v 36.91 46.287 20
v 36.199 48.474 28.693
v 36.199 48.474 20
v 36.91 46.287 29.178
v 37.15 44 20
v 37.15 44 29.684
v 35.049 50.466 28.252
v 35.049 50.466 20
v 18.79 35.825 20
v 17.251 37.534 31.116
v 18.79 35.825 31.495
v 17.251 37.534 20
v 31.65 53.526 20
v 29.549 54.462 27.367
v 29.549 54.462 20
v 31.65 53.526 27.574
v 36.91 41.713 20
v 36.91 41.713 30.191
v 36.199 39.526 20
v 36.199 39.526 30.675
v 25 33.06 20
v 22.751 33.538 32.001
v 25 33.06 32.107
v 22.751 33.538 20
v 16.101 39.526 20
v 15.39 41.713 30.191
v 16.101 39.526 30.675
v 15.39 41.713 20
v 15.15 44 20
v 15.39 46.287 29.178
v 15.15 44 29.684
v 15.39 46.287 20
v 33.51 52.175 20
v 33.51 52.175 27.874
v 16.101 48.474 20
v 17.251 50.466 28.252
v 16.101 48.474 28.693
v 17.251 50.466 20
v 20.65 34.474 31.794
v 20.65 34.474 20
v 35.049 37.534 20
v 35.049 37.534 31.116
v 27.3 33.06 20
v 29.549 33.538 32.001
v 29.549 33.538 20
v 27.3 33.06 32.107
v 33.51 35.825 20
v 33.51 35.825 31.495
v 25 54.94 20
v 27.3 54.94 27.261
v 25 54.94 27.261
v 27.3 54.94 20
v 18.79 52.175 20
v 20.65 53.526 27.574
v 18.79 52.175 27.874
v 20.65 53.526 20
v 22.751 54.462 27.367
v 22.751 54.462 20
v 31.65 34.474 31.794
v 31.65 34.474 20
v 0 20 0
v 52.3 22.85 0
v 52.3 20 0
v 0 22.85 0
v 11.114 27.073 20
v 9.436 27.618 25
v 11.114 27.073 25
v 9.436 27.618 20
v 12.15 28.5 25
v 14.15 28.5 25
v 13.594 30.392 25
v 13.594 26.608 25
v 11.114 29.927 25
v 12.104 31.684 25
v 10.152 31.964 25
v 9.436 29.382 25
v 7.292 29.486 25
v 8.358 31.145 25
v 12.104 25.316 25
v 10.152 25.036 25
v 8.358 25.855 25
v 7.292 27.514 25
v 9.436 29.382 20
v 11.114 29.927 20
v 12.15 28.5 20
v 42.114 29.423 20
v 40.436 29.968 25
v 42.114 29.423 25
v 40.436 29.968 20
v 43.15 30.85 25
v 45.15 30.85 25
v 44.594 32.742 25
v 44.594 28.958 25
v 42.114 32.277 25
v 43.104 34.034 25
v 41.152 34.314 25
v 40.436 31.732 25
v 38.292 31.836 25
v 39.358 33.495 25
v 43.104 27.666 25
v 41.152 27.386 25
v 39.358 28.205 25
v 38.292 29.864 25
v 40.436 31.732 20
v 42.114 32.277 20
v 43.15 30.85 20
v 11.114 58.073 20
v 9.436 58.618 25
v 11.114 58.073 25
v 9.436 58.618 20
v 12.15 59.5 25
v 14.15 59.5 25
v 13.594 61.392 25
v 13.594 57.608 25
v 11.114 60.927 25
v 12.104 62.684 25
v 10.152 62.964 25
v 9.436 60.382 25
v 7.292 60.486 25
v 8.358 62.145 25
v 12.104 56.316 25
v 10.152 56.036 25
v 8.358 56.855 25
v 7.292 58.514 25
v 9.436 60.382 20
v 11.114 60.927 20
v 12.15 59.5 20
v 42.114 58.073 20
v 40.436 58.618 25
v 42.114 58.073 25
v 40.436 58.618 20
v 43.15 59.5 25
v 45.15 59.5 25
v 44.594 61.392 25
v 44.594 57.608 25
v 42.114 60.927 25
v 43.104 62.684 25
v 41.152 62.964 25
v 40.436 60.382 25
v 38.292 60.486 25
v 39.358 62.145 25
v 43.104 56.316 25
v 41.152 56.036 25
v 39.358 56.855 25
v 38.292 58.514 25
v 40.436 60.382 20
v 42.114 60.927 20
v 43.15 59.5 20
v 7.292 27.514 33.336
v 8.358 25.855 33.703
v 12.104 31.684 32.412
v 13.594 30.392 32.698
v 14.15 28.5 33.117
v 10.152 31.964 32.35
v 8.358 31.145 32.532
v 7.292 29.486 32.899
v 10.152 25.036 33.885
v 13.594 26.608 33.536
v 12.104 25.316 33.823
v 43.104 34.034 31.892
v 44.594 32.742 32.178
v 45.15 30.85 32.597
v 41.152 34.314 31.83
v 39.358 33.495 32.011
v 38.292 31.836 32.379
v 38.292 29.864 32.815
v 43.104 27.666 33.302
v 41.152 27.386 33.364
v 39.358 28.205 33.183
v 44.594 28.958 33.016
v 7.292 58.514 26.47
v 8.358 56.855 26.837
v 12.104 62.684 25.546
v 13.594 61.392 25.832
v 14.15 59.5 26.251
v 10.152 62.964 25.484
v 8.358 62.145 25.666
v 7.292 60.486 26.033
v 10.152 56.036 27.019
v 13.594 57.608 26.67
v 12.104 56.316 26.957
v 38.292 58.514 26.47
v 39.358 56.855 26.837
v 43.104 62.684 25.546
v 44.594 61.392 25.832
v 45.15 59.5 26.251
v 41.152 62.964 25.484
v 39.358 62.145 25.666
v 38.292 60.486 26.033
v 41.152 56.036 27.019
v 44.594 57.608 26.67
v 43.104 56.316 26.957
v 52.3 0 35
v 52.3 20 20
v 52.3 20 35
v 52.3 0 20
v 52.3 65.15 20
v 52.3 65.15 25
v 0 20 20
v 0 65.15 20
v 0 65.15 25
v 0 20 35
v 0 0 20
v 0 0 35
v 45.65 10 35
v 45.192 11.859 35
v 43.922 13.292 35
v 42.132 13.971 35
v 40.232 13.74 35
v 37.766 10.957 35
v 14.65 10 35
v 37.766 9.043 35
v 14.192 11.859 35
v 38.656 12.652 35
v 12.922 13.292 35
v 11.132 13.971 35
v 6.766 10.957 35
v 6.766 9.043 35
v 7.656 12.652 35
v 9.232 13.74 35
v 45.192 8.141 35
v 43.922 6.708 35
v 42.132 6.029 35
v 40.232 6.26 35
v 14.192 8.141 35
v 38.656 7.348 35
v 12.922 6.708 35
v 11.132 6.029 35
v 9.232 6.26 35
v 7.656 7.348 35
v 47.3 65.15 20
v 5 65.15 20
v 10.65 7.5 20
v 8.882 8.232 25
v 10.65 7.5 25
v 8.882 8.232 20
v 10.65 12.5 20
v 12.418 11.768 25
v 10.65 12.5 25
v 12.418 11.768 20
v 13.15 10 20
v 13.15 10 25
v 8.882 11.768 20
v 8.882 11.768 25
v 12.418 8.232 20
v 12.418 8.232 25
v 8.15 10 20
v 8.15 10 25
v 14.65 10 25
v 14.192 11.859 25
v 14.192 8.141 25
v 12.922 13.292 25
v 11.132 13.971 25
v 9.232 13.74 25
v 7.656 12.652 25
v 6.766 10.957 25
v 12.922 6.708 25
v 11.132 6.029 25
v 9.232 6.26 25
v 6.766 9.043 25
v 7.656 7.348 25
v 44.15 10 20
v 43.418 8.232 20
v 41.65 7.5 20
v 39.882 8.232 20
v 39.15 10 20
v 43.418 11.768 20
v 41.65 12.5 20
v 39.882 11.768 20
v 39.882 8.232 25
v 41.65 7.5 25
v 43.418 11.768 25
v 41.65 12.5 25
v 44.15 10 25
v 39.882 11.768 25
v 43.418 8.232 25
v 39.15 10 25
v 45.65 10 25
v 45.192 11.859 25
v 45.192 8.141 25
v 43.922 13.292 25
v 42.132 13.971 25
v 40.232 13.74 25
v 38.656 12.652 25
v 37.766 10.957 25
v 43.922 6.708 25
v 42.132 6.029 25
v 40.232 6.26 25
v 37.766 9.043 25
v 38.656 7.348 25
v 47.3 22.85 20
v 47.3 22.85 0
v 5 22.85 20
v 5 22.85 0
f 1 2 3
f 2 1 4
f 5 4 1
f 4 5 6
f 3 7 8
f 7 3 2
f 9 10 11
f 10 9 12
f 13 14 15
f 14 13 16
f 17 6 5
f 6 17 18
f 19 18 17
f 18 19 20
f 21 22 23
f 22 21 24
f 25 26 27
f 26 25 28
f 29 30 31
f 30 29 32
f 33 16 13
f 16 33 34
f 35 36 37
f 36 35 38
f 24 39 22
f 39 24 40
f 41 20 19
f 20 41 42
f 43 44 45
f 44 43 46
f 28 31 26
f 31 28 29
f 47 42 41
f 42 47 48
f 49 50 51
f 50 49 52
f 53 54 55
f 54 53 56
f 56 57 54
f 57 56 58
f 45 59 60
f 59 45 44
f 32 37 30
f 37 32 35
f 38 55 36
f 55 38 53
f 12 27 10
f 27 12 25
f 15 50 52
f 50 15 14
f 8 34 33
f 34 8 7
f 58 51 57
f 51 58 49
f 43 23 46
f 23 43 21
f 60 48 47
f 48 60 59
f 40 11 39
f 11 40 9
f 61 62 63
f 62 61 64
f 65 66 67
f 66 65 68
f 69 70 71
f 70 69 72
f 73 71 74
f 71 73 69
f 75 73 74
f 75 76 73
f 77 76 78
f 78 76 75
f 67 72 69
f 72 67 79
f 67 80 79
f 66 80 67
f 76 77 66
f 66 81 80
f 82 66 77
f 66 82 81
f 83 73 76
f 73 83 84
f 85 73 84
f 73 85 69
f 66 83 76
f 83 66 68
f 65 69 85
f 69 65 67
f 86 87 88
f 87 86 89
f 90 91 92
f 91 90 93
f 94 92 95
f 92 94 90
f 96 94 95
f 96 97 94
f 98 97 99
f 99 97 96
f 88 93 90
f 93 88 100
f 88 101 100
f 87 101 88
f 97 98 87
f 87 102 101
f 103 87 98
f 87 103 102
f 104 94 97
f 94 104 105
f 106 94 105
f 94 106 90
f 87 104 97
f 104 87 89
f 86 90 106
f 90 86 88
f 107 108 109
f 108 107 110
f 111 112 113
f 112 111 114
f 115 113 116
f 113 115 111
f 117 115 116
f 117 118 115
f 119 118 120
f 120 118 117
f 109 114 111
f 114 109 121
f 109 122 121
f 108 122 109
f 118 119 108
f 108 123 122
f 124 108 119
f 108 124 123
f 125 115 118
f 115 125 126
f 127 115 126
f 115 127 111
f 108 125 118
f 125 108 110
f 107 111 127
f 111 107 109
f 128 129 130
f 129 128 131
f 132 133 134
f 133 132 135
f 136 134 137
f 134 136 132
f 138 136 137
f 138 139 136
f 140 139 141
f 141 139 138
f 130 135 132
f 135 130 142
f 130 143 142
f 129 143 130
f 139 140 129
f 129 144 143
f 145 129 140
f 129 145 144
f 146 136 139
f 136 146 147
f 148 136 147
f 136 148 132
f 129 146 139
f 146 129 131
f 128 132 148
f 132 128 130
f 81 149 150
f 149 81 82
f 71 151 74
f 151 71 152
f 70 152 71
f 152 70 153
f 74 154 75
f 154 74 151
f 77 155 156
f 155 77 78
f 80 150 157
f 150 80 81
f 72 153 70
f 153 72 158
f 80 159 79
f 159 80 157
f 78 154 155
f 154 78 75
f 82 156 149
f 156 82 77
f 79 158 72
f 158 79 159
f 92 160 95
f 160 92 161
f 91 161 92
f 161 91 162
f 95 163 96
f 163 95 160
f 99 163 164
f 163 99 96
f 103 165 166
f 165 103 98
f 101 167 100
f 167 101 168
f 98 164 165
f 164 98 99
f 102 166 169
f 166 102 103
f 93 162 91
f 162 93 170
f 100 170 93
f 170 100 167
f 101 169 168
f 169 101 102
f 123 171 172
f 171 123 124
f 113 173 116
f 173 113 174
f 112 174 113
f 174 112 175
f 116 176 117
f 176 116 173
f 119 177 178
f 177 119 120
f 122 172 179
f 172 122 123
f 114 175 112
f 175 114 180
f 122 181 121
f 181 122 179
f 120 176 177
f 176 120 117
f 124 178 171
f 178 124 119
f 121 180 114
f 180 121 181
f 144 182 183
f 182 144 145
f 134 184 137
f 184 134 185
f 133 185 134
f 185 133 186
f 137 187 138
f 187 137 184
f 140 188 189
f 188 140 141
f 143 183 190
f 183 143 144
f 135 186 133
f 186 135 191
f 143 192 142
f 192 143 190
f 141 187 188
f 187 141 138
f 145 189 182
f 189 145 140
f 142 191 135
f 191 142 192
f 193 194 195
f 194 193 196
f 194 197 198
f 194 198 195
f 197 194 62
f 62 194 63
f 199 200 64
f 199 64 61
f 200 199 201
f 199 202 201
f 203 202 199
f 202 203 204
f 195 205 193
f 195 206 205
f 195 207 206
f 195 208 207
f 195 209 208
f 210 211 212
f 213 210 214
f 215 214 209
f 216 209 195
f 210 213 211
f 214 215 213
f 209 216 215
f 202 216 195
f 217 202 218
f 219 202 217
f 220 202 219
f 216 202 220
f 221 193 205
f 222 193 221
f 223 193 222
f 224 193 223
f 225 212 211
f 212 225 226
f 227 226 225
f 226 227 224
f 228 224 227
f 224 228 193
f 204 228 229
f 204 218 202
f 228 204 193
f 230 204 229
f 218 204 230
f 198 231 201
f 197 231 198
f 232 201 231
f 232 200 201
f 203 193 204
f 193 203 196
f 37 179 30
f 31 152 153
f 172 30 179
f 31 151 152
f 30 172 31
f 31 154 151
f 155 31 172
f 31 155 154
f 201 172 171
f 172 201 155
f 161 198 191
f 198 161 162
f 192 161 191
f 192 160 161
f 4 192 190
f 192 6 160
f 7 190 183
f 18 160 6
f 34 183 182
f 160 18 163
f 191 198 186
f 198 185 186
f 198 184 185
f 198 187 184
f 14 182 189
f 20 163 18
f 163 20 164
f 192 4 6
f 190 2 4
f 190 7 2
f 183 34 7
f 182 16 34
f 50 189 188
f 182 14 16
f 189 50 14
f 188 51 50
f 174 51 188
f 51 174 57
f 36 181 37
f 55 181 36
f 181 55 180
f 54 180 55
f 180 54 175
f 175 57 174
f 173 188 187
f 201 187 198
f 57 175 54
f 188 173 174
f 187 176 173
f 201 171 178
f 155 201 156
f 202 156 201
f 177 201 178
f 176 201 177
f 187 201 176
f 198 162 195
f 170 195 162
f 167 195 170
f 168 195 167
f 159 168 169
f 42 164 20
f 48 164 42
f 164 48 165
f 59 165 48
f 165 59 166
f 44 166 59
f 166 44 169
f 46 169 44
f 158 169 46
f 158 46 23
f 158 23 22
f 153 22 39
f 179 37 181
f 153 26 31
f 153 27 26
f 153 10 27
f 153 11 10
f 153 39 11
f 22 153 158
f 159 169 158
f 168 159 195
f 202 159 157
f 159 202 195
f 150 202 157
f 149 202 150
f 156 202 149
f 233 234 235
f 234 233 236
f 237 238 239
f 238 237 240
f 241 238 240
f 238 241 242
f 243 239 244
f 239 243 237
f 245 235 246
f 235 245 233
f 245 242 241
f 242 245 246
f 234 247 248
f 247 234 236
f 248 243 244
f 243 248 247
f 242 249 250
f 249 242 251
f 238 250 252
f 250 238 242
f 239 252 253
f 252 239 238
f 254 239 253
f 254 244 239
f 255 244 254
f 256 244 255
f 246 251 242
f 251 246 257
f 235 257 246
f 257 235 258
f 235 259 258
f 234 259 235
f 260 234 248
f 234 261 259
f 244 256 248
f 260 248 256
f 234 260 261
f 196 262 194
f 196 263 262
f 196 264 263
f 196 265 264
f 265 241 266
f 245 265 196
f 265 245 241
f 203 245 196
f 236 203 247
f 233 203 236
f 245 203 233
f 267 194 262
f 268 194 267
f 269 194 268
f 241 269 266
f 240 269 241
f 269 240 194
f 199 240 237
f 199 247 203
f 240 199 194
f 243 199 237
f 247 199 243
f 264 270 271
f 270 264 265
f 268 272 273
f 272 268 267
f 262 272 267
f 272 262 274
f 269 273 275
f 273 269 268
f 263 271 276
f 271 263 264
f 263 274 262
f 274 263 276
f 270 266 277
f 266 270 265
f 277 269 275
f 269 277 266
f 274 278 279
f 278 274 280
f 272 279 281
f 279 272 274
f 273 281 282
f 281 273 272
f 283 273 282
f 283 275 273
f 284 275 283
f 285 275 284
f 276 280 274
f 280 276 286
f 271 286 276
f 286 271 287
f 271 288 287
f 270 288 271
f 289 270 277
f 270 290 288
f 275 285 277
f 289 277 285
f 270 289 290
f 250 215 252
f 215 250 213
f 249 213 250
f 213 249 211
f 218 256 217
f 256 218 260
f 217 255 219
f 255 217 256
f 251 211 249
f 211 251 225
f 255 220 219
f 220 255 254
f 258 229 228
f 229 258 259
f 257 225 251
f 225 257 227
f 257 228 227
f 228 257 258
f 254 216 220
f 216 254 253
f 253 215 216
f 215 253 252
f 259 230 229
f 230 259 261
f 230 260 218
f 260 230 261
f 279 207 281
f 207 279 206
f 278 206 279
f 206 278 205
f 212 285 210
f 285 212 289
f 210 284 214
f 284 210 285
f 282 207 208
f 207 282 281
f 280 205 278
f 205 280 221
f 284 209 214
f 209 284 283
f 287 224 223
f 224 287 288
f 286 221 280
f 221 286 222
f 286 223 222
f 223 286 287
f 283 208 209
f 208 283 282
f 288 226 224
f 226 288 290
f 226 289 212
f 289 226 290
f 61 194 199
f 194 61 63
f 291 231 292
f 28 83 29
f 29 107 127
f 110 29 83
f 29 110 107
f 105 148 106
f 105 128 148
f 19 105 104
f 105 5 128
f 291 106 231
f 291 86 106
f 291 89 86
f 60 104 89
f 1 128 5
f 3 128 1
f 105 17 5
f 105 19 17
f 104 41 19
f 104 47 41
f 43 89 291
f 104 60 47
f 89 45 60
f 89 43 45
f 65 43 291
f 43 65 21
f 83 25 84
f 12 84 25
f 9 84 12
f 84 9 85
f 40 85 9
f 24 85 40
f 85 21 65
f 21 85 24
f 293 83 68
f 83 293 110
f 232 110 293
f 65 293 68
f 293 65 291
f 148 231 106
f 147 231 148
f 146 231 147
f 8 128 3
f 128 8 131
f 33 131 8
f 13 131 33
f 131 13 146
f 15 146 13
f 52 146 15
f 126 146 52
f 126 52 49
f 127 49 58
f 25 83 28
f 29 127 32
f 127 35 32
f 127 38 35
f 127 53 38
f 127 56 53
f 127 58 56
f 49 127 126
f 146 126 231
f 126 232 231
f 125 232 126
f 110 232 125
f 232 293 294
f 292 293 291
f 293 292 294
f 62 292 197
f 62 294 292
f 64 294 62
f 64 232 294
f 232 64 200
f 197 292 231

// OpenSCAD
thickness=5;


// 8

screw=(42.3-31)/2;
padding=(23+1)-42.3/2;

difference() {
    hull() {
        cube([42.3+thickness*2, 42.3+20+padding, 20+thickness]);
        translate([0, 0, 20+thickness]) cube([42.3+thickness*2, 20, 10]);
    }
    translate([thickness, 20+padding, 0]) holes(20+thickness,10);
    
    translate([thickness+screw, 20/2, 20]) cylinder(d=5,h=thickness);
    translate([thickness+42.3-screw, 20/2, 20]) cylinder(d=5,h=thickness);
    translate([thickness+screw, 20/2, 20+thickness]) cylinder(d=8,h=10);
    translate([thickness+42.3-screw, 20/2, 20+thickness]) cylinder(d=8,h=10);
    
    cube([42.3+thickness*2, 20, 20]);
    translate([thickness, 20+padding, 0]) cube([42.3, 42.3, 20]);
    mirror([0, 0, 1]) rotate([0, 90, 0]) linear_extrude(height=42.3+thickness*2)
        polygon([[0, 20+padding], [20, 20+padding+42.3+0.0001], [0, 20+padding+42.3+0.0001]]);
}

/*
difference() {
    cube([20, 35, thickness]);
    translate([20/2, 24, 0]) cylinder(d=8.5, h=thickness);
}*/

module holes(h1, h2) {
    translate([42.3/2, (42.3)/2, 0]) cylinder(d=22, h=h1+h2);
    
    translate([screw, screw, 0]) cylinder(d=3,h=h1);
    translate([42.3-screw, 8, 0]) cylinder(d=3,h=h1);
    translate([screw, 42.3-screw, 0]) cylinder(d=3,h=h1);
    translate([42.3-screw, 42.3-screw, 0]) cylinder(d=3,h=h1);
    
    translate([screw, screw, h1]) cylinder(d=7,h=h2);
    translate([42.3-screw, 8, h1]) cylinder(d=7,h=h2);
    translate([screw, 42.3-screw, h1]) cylinder(d=7,h=h2);
    translate([42.3-screw, 42.3-screw, h1]) cylinder(d=7,h=h2);
}
